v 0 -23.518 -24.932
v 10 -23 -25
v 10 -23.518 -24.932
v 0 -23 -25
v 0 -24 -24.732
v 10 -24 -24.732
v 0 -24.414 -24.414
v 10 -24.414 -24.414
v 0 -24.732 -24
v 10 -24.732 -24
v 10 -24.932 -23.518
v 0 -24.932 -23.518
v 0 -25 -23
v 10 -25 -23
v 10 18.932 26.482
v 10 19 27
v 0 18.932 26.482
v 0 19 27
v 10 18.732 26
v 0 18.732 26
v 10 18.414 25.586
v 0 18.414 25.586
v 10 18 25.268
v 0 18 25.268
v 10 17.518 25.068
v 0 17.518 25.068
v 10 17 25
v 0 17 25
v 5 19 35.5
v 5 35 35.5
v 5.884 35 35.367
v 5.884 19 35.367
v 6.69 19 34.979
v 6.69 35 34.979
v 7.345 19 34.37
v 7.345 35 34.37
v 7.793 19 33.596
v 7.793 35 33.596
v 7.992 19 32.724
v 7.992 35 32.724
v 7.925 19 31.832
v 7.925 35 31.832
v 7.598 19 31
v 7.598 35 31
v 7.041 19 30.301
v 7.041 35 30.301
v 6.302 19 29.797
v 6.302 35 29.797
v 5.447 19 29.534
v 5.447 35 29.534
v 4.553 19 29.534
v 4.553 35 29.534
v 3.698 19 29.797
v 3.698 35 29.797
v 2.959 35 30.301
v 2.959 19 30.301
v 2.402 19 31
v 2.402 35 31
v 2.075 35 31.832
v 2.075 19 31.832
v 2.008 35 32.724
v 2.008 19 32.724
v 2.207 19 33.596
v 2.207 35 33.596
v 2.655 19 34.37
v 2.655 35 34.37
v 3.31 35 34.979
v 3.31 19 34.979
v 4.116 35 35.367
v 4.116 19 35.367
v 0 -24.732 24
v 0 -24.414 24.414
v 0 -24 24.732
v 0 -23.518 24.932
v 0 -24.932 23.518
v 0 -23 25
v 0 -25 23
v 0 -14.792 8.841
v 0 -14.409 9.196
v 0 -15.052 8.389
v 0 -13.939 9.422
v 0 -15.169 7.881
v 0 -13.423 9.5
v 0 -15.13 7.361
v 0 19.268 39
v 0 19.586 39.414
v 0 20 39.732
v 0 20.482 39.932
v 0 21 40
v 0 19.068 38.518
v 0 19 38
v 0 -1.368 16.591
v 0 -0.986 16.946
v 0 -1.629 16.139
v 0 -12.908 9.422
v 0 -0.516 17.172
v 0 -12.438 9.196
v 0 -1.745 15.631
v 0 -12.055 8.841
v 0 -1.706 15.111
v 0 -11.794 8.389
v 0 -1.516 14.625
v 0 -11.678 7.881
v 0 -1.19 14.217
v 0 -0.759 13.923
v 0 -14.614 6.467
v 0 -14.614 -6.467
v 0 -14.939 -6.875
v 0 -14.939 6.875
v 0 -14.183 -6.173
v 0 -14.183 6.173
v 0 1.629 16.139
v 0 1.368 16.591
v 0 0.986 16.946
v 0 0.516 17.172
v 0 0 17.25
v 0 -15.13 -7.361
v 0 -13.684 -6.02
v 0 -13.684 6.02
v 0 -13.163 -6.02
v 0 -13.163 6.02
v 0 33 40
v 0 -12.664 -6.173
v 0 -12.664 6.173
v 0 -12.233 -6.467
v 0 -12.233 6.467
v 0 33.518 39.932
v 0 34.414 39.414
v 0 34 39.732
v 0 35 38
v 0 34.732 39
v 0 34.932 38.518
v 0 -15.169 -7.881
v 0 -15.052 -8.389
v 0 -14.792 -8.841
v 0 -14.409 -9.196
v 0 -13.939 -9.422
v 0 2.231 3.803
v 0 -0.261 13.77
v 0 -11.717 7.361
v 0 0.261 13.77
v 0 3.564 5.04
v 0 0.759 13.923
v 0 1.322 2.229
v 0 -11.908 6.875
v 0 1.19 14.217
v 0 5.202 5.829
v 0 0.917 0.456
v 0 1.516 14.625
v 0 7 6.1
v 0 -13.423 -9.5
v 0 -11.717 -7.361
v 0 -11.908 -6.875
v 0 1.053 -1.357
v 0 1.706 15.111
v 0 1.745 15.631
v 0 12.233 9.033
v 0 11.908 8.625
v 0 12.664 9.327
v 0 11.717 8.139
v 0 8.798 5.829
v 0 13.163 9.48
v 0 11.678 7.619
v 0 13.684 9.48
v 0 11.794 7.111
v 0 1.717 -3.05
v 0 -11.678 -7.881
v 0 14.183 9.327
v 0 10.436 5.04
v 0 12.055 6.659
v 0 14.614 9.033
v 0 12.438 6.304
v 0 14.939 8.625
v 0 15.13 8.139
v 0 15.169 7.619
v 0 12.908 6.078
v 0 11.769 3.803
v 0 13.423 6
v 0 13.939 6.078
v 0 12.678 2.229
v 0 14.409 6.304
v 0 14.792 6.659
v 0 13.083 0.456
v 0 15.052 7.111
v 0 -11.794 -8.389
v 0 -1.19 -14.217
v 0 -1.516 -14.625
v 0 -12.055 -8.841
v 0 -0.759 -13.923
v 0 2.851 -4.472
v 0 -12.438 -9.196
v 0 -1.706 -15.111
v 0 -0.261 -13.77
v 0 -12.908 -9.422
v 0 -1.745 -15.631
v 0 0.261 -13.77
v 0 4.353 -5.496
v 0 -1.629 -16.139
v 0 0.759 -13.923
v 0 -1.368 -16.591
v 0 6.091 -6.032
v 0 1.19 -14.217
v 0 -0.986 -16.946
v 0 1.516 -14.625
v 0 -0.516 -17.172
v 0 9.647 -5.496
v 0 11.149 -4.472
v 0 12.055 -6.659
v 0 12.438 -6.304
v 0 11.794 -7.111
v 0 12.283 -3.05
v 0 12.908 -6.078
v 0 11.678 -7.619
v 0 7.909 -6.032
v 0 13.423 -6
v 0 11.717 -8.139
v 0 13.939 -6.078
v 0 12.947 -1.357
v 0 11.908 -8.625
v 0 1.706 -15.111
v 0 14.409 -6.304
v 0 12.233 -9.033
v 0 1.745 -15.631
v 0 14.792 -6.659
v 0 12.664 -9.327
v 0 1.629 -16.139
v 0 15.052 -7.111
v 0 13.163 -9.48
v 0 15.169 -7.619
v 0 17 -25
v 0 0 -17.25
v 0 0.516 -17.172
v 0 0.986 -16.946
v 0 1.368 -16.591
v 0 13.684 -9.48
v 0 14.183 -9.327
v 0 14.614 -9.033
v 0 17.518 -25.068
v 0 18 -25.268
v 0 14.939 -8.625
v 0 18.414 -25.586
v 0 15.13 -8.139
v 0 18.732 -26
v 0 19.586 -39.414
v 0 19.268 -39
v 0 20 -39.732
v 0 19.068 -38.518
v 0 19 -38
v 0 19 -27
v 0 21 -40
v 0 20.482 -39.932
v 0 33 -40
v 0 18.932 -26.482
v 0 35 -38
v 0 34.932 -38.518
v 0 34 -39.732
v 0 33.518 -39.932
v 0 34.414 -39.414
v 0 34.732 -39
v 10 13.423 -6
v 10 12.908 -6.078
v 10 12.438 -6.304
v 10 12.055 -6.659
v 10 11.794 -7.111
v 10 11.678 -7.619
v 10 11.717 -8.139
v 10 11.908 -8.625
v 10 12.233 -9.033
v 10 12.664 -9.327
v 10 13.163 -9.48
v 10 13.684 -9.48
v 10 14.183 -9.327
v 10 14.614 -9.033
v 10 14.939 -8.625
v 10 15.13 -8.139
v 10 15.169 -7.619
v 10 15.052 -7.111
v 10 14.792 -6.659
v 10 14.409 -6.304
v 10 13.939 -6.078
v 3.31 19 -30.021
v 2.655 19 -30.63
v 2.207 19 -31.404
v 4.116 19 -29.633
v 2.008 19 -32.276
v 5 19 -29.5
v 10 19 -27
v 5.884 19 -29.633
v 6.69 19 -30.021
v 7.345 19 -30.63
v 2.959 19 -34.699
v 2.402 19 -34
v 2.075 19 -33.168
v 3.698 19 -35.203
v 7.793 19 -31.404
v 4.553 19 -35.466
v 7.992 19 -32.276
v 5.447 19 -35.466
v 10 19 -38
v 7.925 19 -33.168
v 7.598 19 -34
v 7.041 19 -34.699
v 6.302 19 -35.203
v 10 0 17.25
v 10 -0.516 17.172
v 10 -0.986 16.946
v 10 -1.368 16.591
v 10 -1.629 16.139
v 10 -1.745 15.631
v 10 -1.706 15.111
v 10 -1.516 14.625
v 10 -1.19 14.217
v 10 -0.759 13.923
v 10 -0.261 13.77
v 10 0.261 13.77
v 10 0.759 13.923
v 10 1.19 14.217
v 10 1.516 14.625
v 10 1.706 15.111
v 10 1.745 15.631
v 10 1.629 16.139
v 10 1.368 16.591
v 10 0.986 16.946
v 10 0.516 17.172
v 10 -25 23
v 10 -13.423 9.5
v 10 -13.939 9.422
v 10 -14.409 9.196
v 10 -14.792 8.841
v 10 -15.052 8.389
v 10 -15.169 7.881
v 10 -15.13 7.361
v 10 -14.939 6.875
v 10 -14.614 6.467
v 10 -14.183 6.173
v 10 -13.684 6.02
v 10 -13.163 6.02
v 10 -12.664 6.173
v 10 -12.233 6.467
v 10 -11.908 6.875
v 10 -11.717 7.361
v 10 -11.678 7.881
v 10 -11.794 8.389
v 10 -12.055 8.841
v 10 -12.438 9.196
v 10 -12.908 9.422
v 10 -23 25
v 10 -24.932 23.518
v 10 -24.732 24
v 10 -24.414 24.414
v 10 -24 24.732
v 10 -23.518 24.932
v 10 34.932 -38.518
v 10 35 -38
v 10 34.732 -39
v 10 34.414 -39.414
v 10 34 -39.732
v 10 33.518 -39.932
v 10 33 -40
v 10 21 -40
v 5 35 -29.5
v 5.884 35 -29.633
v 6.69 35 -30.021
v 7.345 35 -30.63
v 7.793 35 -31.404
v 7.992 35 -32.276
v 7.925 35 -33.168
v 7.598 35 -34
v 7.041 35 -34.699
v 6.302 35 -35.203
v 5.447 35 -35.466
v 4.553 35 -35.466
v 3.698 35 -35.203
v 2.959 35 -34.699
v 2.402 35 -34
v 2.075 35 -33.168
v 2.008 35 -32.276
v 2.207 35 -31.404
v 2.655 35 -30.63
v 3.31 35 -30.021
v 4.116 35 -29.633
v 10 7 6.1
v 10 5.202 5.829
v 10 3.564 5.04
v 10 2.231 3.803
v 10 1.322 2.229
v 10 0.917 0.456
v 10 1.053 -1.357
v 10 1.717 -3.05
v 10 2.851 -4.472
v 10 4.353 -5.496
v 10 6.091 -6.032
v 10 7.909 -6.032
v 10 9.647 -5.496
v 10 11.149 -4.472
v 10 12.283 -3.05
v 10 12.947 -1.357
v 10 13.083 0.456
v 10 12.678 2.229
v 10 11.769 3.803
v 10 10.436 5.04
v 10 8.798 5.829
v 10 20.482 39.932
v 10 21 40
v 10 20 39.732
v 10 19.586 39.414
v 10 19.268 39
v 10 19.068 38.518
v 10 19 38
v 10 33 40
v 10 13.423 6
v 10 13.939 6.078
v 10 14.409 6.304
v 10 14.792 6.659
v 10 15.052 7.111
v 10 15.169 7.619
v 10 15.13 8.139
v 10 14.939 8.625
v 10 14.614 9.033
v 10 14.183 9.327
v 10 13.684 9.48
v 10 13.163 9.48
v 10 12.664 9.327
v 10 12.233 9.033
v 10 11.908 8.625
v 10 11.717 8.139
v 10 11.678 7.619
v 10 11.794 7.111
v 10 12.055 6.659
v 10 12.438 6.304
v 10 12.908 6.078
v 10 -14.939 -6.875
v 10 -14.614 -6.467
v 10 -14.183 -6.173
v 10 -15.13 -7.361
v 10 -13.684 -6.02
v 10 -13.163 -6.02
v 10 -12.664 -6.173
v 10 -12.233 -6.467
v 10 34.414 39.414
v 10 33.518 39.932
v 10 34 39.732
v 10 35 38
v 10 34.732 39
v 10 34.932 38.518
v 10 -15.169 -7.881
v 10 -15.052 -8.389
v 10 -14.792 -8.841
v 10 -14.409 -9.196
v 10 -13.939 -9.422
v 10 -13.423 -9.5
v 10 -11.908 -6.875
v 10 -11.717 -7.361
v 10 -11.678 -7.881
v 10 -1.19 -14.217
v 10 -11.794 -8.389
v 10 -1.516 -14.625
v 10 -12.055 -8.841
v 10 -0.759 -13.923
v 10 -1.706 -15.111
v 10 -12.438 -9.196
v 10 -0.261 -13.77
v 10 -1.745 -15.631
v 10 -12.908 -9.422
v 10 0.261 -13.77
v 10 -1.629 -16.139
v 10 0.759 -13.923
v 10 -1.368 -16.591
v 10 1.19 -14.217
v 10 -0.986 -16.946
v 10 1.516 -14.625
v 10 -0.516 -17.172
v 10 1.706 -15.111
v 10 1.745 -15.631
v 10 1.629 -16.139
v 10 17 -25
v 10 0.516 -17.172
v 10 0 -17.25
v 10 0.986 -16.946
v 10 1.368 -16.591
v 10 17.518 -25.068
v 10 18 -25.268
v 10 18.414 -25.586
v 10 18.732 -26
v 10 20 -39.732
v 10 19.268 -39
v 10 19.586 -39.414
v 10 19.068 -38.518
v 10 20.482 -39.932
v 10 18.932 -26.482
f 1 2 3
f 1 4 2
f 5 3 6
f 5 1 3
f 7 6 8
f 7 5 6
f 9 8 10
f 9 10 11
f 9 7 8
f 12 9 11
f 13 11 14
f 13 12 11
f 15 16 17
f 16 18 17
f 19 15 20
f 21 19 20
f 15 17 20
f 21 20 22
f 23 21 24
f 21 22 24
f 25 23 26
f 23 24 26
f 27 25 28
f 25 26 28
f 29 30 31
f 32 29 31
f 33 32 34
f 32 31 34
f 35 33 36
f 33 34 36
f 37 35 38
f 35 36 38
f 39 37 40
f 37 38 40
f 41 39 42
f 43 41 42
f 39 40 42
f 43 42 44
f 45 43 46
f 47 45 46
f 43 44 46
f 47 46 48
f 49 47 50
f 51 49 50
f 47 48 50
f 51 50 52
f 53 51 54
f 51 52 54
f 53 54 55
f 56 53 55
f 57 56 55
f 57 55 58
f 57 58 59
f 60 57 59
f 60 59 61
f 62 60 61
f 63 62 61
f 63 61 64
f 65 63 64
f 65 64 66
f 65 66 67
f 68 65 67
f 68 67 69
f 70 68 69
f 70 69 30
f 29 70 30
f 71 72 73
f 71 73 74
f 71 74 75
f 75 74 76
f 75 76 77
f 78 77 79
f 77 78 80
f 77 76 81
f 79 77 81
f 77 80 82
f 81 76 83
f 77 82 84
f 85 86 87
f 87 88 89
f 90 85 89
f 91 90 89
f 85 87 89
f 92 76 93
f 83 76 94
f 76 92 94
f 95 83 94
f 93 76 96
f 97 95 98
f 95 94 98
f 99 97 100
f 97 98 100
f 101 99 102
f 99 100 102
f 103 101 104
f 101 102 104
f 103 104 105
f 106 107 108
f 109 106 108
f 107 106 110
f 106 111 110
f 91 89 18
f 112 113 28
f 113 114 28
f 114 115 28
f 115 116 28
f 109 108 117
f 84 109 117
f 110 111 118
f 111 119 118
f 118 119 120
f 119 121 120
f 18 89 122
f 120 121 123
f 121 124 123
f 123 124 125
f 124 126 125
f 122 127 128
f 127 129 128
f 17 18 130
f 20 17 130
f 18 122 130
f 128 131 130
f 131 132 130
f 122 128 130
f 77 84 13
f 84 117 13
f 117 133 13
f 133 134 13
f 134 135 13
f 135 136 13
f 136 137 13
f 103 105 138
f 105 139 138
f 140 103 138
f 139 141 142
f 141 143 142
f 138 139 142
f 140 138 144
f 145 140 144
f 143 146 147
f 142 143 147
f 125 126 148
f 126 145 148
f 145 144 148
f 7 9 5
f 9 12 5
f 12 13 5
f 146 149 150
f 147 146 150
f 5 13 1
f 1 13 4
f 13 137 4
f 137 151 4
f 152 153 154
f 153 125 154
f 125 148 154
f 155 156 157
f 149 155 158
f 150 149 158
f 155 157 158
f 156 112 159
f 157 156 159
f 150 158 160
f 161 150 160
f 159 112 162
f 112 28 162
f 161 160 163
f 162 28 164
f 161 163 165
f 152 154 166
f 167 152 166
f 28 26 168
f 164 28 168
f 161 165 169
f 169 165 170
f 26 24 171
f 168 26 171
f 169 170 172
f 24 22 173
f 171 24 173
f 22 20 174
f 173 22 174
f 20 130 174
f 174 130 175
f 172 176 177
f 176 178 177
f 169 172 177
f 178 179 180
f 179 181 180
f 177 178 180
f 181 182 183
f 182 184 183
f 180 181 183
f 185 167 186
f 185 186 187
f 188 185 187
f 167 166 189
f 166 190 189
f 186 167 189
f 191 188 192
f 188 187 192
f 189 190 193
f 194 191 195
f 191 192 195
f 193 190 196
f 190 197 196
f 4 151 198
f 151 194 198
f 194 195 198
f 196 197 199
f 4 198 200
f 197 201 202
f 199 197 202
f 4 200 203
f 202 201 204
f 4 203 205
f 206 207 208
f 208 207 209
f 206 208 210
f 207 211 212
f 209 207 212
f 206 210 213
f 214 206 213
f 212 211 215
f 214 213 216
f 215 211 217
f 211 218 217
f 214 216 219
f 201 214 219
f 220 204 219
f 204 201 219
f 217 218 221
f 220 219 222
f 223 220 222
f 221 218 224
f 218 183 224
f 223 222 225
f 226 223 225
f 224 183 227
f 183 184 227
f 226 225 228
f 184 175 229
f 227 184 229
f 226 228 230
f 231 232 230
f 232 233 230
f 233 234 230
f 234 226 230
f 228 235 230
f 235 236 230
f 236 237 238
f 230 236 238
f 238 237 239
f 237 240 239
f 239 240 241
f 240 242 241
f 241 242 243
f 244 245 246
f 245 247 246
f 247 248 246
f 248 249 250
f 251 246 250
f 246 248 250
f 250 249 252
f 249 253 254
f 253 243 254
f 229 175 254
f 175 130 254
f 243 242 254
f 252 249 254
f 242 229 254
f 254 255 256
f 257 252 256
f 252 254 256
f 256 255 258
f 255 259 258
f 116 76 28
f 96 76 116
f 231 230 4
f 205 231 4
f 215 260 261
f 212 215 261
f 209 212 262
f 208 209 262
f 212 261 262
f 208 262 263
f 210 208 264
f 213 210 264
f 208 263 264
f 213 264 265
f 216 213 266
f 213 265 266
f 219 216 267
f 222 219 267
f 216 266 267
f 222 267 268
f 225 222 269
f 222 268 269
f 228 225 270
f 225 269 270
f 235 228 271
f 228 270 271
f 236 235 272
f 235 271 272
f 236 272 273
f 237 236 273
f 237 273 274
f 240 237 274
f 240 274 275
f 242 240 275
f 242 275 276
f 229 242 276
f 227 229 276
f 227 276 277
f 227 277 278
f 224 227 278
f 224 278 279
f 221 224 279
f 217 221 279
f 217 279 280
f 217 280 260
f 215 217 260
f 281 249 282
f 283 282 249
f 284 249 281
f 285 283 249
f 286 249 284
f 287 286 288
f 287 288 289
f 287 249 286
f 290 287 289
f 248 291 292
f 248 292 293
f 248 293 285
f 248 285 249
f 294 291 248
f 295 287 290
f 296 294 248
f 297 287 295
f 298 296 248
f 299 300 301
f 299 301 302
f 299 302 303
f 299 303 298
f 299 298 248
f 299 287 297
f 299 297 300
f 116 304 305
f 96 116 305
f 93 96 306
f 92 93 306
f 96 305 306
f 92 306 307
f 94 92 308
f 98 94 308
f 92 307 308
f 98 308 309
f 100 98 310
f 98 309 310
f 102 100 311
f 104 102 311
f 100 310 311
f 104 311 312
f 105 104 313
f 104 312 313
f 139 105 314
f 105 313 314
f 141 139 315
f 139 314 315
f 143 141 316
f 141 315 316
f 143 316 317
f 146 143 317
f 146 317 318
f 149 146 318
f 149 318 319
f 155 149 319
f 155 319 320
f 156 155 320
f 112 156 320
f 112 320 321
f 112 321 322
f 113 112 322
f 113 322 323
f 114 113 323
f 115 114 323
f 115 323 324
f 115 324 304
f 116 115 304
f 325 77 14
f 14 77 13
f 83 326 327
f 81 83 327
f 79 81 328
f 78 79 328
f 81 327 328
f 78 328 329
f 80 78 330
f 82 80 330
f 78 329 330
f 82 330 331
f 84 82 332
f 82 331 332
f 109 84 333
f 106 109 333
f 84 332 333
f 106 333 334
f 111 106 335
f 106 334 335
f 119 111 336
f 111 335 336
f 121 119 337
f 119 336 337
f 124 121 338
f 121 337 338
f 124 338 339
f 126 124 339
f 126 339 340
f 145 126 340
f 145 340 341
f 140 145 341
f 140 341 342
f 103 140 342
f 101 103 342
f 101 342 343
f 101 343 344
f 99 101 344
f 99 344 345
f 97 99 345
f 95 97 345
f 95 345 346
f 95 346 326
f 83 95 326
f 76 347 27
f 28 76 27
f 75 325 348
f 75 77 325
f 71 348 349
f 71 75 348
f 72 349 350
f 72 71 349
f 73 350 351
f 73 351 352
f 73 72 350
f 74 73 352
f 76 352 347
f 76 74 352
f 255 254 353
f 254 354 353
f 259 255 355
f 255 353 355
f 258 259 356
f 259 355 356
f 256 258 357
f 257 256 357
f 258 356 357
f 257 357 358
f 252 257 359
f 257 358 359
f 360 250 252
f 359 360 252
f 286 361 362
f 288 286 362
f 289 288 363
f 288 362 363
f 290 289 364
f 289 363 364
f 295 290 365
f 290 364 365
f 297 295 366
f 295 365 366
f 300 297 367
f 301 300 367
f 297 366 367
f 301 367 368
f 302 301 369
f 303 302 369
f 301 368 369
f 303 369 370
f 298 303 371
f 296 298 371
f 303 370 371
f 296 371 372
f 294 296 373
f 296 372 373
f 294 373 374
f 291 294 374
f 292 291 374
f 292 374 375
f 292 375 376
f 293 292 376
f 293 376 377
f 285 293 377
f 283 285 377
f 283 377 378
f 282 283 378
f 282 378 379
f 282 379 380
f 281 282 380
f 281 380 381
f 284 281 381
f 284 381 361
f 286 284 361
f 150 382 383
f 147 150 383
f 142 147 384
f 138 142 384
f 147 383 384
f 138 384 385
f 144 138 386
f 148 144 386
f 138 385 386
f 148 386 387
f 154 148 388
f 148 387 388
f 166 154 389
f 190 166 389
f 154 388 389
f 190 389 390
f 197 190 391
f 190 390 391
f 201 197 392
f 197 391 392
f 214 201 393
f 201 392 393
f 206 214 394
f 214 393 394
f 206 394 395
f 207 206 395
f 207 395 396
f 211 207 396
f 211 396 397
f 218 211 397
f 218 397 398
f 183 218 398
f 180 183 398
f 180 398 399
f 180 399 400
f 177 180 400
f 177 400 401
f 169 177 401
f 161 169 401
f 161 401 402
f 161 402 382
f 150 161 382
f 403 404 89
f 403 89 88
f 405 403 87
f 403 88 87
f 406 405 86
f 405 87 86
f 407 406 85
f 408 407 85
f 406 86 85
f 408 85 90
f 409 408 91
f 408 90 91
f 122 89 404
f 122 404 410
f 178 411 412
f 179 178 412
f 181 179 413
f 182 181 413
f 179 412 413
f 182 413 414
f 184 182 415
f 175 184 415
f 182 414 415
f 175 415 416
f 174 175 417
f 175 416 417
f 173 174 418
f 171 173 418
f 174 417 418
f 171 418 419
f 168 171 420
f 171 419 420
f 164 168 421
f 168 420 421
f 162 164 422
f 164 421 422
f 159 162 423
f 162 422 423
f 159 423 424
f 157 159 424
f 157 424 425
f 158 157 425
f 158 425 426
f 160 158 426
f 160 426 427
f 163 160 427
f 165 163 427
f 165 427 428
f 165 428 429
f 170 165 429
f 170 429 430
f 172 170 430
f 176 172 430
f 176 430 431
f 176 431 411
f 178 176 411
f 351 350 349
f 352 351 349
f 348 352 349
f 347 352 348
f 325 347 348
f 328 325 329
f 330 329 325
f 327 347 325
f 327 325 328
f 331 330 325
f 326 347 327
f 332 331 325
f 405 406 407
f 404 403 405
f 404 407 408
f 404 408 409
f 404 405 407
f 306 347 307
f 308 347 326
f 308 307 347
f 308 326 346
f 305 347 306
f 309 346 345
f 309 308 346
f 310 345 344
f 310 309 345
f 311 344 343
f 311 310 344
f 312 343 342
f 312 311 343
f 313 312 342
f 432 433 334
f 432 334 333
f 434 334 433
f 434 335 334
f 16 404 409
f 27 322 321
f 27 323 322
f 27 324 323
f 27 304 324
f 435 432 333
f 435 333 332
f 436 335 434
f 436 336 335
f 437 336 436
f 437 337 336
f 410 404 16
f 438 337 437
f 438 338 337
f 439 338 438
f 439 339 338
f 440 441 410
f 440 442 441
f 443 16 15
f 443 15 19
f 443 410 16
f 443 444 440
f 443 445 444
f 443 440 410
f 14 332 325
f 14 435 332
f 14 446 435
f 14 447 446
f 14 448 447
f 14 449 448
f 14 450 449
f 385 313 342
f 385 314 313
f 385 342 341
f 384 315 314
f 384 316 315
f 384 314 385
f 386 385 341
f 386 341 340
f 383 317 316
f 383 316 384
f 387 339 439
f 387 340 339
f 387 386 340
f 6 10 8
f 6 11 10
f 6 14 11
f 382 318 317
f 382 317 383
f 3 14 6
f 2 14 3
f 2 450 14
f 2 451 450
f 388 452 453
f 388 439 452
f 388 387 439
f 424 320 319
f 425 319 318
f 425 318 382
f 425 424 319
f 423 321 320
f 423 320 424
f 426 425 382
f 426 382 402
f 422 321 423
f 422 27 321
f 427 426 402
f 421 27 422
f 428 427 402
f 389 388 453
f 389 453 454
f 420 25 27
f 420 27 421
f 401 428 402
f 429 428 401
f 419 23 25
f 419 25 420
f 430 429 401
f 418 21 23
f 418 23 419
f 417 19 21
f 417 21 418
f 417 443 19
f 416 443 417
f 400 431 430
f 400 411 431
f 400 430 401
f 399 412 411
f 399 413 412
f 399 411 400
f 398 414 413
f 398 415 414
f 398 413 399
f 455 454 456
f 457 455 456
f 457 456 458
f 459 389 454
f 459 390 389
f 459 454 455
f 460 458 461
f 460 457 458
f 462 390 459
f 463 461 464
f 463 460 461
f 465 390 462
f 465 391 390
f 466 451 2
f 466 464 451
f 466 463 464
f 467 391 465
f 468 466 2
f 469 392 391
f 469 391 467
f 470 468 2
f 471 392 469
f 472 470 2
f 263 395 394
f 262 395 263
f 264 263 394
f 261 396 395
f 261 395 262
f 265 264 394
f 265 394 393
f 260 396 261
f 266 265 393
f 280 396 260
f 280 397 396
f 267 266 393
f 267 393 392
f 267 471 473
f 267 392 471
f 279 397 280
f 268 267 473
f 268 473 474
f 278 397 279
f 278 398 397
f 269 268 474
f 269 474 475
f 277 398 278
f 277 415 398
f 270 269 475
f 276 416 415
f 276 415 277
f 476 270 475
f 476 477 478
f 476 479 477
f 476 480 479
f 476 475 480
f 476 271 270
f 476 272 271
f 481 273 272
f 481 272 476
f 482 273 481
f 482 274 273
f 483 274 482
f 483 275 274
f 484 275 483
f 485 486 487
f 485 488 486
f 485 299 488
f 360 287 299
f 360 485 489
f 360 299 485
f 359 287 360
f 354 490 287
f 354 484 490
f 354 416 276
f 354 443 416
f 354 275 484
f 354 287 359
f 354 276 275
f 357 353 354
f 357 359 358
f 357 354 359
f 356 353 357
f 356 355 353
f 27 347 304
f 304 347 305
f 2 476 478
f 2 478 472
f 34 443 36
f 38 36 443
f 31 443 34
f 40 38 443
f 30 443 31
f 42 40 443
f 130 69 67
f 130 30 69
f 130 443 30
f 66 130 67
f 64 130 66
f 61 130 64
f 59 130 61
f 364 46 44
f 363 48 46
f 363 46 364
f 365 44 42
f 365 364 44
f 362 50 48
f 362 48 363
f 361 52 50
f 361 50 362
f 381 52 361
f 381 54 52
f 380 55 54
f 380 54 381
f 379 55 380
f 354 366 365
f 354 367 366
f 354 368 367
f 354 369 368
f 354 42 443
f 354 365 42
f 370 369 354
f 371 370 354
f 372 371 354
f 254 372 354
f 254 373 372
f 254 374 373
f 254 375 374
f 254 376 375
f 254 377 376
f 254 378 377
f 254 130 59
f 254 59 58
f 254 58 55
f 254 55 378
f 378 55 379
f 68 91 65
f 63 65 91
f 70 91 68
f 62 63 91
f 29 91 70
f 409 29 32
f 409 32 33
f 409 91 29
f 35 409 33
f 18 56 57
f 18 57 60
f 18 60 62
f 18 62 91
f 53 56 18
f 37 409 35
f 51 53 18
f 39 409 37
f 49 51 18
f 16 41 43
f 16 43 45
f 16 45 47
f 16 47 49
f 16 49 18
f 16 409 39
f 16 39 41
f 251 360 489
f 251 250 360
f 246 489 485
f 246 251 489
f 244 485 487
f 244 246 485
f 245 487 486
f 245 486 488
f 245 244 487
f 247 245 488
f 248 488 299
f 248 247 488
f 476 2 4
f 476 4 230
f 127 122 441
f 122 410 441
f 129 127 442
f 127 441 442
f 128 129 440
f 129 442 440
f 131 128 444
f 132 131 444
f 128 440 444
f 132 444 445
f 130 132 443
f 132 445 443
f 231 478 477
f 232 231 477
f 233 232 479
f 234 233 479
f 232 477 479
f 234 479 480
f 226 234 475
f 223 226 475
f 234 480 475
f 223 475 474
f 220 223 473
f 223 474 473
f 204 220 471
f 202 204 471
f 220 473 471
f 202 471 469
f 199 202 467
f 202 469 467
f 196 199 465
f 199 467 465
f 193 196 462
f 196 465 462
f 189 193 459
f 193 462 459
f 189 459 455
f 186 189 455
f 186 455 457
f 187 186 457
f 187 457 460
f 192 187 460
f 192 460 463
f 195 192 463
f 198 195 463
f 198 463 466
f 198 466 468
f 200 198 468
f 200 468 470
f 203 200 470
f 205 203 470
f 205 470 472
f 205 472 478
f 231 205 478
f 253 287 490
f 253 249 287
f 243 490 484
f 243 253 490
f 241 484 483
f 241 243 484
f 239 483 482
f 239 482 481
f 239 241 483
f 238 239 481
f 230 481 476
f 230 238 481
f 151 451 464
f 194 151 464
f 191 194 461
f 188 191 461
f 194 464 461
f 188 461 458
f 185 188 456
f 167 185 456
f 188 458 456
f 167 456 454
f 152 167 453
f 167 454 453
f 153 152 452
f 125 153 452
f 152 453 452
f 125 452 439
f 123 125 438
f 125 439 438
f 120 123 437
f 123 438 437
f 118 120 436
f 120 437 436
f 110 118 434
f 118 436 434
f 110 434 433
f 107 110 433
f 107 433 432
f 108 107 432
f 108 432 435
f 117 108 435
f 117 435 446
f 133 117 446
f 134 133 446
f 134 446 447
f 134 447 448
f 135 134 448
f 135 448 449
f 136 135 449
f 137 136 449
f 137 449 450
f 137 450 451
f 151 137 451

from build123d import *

# Parameters (mm, degrees)
SKETCH1_W           = 80
SKETCH1_H           = 60
BOSS_EXTRUDE1_DEPTH = 10
SKETCH2_R           = 6.1
CUT_EXTRUDE1_DEPTH  = 55.083269132
SKETCH3_R           = 1.75
CUT_EXTRUDE3_DEPTH  = 55.083269132
SKETCH4_W           = 15
SKETCH4_H           = 44
CUT_EXTRUDE4_DEPTH  = 50
SKETCH5_R           = 3
CUT_EXTRUDE5_DEPTH  = 50
FILLET1_R           = 2


with BuildPart() as part:
    # Sketch1 → Boss-Extrude1 (new body)
    with BuildSketch(Plane(origin=(0, 0, 0), x_dir=(0, 0, -1), z_dir=(1, 0, 0))):
        with Locations((0, 5)):
            Rectangle(SKETCH1_W, SKETCH1_H)
    extrude(amount=BOSS_EXTRUDE1_DEPTH)

    # Sketch2 → Cut-Extrude1 (cut, through all)
    with BuildSketch(Plane(origin=(10, 0, 0), x_dir=(0, 0, -1), z_dir=(1, 0, 0))):
        with Locations(Location((0, 7, 0), (0, 0, 180))):
            Circle(SKETCH2_R)
    extrude(amount=-CUT_EXTRUDE1_DEPTH, mode=Mode.SUBTRACT)

    # Sketch3 → Cut-Extrude3 (cut, through all)
    with BuildSketch(Plane(origin=(10, 0, 0), x_dir=(0, 0, -1), z_dir=(1, 0, 0))):
        with Locations((7.75, -13.423393759)):
            Circle(SKETCH3_R)
        with Locations(Location((-7.75, -13.423393759, 0), (0, 0, 180))):
            Circle(SKETCH3_R)
        with Locations((-7.75, 13.423393759)):
            Circle(SKETCH3_R)
        with Locations(Location((7.75, 13.423393759, 0), (0, 0, 180))):
            Circle(SKETCH3_R)
        with Locations((15.5, 0)):
            Circle(SKETCH3_R)
        with Locations(Location((-15.5, 0, 0), (0, 0, 180))):
            Circle(SKETCH3_R)
    extrude(amount=-CUT_EXTRUDE3_DEPTH, mode=Mode.SUBTRACT)

    # Sketch4 → Cut-Extrude4 (cut)
    with BuildSketch(Plane(origin=(10, 0, 0), x_dir=(0, 0, -1), z_dir=(1, 0, 0))):
        with Locations((-32.5, -3)):
            Rectangle(SKETCH4_W, SKETCH4_H)
        with Locations((32.5, -3)):
            Rectangle(SKETCH4_W, SKETCH4_H)
    extrude(amount=-CUT_EXTRUDE4_DEPTH, mode=Mode.SUBTRACT)

    # Sketch5 → Cut-Extrude5 (cut)
    with BuildSketch(Plane(origin=(0, 35, 0), x_dir=(1, 0, 0), z_dir=(0, 1, 0))):
        with Locations(Location((5, 32.5, 0), (0, 0, 270))):
            Circle(SKETCH5_R)
        with Locations(Location((5, -32.5, 0), (0, 0, 270))):
            Circle(SKETCH5_R)
    extrude(amount=-CUT_EXTRUDE5_DEPTH, mode=Mode.SUBTRACT)

    # Fillet1
    fillet1_edges = [part.edges().sort_by_distance(p)[0] for p in [
        (5, 19, 40),
        (5, 19, 25),
        (5, -25, 25),
        (5, -25, -25),
        (5, 19, -25),
        (5, 19, -40),
        (5, 35, 40),
        (5, 35, -40),
    ]]
    fillet(fillet1_edges, radius=FILLET1_R)


solid = part.part
